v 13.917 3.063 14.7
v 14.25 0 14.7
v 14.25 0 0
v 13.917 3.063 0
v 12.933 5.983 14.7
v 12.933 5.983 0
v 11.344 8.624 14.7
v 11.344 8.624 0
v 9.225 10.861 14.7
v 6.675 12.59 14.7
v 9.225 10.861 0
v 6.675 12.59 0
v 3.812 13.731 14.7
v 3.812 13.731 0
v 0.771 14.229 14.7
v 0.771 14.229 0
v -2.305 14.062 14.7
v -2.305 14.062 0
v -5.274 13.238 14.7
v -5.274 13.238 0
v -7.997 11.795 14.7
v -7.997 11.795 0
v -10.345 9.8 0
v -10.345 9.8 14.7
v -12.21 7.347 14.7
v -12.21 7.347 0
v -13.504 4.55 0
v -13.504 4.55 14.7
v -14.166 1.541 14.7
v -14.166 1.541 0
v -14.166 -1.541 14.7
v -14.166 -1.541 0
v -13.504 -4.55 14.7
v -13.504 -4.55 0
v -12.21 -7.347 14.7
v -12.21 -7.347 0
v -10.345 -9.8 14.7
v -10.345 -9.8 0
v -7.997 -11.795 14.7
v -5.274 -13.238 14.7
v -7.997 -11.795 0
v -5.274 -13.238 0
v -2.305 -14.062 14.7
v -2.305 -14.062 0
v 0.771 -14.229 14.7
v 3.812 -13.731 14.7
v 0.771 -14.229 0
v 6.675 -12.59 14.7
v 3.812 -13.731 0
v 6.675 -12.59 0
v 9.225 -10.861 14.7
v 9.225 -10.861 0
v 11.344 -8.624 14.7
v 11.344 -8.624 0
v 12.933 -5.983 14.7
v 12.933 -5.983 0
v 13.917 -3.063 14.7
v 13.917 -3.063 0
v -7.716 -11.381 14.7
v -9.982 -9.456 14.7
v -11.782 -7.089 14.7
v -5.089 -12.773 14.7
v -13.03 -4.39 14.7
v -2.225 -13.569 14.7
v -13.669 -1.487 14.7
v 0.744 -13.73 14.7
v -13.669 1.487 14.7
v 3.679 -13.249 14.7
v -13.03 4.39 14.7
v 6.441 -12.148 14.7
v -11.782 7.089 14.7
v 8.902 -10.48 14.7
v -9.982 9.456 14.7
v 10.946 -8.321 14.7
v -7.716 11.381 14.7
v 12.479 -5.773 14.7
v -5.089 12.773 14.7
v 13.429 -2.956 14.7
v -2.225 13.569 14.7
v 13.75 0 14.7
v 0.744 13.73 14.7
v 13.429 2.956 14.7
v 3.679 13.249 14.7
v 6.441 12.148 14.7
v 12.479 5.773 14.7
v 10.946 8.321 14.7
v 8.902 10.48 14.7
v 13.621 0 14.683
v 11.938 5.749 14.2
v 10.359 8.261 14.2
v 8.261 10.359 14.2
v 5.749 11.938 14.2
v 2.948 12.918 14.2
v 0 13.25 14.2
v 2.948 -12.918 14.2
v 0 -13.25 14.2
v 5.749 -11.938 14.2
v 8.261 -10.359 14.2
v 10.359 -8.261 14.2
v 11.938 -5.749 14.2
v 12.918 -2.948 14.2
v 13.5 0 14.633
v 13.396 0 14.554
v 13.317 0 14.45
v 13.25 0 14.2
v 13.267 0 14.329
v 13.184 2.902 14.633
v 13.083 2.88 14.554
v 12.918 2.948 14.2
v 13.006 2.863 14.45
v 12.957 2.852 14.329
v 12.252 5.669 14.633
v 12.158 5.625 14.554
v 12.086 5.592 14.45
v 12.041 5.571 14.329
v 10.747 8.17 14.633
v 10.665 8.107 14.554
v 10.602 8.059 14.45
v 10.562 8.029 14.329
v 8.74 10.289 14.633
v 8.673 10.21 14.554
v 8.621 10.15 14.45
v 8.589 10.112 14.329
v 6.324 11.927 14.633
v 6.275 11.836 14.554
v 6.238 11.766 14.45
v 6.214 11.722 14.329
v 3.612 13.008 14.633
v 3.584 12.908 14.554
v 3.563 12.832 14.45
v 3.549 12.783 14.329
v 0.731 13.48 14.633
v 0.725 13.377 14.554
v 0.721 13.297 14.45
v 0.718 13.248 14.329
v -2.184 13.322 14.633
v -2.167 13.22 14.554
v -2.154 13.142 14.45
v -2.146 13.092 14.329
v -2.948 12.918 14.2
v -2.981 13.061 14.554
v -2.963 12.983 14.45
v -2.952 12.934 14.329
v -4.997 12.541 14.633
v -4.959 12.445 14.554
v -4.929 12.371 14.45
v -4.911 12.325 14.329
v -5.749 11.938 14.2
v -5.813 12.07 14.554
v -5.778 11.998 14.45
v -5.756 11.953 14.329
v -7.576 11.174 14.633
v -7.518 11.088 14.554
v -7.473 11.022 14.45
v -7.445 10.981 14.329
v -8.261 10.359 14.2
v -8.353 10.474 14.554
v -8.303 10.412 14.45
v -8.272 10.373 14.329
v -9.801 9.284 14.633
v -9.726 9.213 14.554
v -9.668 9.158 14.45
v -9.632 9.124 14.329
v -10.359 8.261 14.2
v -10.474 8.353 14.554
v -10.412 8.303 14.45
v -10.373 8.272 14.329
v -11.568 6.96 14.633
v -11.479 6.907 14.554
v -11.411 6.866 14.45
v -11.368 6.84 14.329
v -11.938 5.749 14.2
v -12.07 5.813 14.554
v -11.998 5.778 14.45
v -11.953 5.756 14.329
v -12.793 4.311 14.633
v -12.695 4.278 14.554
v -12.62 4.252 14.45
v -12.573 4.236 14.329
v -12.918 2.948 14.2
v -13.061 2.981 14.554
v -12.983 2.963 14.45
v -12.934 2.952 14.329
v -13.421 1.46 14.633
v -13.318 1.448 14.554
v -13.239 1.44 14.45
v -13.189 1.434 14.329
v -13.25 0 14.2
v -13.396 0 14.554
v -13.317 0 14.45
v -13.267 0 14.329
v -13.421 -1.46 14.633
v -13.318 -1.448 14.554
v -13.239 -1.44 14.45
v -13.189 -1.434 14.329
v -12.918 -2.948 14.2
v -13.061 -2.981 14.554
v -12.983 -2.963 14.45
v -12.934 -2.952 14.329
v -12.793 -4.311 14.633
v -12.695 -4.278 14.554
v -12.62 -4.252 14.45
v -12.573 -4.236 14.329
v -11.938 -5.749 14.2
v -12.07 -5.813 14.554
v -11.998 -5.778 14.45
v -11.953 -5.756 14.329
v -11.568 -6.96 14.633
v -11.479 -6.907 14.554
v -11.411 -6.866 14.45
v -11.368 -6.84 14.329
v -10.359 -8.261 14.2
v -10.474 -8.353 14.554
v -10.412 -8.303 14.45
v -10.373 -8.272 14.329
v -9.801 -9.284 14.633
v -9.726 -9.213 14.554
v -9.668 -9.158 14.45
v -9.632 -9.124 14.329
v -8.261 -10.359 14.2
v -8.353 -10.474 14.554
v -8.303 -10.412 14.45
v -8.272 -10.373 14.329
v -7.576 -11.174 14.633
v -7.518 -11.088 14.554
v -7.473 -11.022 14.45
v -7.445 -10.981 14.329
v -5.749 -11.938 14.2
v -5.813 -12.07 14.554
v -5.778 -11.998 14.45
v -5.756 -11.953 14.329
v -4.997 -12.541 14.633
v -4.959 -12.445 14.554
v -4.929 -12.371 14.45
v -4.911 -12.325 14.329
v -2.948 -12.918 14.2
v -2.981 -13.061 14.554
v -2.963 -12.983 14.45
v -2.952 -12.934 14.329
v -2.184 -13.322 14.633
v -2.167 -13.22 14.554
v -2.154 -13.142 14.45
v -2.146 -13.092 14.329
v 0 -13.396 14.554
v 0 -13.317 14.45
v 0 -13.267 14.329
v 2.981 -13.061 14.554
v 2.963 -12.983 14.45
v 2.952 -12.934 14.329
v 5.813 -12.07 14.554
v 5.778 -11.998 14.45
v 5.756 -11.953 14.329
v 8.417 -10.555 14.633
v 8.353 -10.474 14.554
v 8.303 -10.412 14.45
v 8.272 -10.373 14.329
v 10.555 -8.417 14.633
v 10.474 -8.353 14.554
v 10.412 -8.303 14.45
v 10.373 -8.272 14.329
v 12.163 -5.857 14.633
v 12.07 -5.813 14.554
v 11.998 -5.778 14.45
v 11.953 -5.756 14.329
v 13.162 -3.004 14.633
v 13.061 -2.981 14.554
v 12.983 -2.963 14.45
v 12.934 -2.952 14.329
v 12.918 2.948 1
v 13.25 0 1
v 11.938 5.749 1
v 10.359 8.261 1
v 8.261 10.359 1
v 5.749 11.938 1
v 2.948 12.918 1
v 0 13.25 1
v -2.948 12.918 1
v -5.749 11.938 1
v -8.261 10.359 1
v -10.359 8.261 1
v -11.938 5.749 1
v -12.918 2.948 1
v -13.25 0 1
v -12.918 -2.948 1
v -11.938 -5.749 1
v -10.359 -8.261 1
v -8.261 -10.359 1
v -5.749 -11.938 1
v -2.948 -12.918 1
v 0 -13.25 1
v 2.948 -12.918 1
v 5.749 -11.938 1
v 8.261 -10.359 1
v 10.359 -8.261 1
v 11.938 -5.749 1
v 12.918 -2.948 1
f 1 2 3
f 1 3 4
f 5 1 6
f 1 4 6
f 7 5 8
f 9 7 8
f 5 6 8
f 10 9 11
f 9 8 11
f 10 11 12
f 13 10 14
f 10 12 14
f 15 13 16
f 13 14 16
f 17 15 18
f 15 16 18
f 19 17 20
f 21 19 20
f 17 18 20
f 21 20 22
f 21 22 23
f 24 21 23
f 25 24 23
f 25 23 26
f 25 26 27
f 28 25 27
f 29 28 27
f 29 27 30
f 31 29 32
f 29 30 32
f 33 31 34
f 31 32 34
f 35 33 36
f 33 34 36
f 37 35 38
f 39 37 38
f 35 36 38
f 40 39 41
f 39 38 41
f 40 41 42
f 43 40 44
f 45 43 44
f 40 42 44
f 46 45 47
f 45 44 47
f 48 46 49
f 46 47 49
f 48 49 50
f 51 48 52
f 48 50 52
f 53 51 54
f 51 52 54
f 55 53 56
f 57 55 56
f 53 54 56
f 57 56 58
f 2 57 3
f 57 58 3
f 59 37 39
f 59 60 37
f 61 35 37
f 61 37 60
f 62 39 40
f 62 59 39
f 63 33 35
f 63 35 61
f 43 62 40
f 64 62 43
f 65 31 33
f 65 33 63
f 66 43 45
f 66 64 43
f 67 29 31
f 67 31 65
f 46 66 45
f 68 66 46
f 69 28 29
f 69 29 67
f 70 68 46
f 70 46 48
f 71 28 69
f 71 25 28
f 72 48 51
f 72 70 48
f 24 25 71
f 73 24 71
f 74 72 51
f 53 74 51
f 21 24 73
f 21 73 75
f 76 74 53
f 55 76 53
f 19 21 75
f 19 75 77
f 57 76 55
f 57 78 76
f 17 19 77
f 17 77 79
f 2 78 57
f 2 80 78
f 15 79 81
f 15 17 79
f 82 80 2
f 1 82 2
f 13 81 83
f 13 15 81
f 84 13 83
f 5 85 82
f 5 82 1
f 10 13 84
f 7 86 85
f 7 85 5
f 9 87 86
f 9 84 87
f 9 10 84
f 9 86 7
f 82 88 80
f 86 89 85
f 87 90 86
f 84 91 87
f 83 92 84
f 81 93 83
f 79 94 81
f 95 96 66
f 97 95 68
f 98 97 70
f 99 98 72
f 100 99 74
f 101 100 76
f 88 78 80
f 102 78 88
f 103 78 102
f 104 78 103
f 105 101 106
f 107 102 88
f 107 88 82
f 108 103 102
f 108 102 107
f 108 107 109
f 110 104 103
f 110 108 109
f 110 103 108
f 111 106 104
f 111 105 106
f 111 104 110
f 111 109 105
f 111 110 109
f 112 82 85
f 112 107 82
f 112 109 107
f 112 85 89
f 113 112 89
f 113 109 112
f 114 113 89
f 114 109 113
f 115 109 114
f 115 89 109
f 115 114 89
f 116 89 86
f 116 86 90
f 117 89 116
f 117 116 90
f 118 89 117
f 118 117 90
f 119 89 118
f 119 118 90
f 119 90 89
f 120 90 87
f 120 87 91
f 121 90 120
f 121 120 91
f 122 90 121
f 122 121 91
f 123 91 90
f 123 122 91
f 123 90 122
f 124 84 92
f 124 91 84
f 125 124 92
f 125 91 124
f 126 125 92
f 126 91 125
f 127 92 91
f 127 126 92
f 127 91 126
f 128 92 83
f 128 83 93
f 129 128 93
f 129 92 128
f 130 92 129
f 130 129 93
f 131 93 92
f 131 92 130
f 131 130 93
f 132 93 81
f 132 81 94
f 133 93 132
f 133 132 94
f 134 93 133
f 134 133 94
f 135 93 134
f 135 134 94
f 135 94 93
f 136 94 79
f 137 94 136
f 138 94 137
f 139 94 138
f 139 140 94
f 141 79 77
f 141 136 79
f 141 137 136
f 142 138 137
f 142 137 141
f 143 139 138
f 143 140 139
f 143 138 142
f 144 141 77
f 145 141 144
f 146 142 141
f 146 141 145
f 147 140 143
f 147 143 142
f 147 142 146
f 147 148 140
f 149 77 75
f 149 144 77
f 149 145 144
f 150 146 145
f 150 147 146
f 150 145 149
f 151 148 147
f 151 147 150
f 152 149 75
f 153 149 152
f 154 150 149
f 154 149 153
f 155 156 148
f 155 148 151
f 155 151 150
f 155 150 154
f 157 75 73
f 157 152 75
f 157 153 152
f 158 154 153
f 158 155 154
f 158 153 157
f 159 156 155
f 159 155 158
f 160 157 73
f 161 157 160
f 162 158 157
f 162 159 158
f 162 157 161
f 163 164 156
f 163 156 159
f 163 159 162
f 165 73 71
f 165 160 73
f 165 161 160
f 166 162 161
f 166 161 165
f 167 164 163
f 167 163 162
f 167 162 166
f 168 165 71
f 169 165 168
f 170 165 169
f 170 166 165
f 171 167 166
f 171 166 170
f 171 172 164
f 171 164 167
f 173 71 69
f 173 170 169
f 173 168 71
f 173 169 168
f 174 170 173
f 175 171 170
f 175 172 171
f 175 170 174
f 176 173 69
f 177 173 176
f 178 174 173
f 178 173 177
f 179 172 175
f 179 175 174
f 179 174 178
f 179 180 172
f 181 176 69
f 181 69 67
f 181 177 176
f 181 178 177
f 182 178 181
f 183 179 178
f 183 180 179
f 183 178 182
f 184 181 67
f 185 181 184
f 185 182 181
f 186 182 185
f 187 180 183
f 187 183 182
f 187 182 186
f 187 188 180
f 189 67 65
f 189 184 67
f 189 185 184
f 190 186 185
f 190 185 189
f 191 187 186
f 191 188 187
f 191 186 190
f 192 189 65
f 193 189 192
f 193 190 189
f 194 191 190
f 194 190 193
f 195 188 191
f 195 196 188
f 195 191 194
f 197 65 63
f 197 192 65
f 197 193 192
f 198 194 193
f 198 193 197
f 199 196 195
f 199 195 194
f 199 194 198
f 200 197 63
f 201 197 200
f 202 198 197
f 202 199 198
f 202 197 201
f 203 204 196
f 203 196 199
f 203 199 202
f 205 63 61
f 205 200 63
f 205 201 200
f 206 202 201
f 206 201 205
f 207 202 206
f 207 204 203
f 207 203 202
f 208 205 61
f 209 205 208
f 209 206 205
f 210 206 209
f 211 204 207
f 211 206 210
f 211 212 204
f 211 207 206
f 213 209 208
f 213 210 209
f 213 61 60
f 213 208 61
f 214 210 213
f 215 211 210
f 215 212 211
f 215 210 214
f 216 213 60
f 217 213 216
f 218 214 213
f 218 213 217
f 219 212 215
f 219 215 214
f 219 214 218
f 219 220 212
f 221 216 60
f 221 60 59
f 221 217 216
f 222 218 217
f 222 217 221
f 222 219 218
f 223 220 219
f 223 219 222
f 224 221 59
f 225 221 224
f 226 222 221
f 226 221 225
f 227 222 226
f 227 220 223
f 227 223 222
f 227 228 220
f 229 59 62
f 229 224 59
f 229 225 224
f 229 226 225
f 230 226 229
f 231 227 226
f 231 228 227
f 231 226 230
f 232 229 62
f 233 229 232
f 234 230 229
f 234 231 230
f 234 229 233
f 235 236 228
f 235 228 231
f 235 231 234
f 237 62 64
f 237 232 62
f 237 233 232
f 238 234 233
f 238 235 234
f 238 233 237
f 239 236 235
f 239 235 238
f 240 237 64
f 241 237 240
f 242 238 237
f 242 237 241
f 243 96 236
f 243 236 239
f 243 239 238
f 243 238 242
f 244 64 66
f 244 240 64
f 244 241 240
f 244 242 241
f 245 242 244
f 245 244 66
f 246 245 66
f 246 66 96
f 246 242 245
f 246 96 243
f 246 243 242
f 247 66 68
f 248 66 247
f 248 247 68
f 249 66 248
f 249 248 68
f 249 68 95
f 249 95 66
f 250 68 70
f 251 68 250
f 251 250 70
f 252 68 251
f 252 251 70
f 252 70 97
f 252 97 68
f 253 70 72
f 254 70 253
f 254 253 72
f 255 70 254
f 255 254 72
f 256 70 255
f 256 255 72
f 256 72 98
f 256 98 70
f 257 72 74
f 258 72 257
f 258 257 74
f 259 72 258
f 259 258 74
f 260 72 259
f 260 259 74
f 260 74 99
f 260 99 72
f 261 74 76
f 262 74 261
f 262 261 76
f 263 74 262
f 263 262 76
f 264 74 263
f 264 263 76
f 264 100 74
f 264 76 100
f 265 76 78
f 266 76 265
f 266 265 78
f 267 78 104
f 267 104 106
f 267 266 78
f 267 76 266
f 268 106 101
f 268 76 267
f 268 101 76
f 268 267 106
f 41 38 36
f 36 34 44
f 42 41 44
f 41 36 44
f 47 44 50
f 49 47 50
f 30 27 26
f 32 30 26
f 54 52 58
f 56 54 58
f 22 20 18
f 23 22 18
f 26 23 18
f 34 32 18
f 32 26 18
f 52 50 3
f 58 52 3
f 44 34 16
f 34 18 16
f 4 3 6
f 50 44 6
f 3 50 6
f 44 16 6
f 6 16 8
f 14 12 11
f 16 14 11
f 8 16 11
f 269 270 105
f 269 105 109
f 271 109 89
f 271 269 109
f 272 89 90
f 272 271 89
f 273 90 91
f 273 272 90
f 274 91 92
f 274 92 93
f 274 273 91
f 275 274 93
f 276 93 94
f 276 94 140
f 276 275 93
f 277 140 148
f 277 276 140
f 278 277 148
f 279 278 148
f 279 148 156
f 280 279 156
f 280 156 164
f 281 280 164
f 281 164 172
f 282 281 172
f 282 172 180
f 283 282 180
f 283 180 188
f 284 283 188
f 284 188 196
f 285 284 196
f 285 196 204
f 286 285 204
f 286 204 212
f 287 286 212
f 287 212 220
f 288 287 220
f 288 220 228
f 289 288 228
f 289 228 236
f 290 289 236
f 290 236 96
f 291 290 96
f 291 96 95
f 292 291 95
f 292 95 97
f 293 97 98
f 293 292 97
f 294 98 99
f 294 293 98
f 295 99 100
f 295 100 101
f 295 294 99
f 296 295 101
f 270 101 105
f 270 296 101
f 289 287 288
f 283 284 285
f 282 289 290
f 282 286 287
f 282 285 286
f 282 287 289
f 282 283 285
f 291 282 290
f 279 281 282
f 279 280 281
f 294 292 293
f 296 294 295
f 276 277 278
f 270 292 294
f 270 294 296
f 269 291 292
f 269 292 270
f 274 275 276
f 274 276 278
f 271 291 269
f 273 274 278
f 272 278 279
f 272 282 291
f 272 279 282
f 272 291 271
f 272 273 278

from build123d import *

# Parameters (mm, degrees)
F0_R     = 14.25
F1_DEPTH = 14.7
F2_T     = -1
F3_R     = 0.5


with BuildPart() as f1:
    # F0 (on Top) → F1 (new body)
    with BuildSketch(Plane.XY):
        Circle(F0_R)
    extrude(amount=F1_DEPTH)

    # F2
    f2_openings = [f1.faces().sort_by_distance(p)[0] for p in [
        (0, 0, 14.7),
    ]]
    offset(amount=F2_T, openings=f2_openings)

    # F3
    f3_edges = [f1.edges().sort_by_distance(p)[0] for p in [
        (-13.25, 0, 14.7),
    ]]
    fillet(f3_edges, radius=F3_R)


solid = f1.part
